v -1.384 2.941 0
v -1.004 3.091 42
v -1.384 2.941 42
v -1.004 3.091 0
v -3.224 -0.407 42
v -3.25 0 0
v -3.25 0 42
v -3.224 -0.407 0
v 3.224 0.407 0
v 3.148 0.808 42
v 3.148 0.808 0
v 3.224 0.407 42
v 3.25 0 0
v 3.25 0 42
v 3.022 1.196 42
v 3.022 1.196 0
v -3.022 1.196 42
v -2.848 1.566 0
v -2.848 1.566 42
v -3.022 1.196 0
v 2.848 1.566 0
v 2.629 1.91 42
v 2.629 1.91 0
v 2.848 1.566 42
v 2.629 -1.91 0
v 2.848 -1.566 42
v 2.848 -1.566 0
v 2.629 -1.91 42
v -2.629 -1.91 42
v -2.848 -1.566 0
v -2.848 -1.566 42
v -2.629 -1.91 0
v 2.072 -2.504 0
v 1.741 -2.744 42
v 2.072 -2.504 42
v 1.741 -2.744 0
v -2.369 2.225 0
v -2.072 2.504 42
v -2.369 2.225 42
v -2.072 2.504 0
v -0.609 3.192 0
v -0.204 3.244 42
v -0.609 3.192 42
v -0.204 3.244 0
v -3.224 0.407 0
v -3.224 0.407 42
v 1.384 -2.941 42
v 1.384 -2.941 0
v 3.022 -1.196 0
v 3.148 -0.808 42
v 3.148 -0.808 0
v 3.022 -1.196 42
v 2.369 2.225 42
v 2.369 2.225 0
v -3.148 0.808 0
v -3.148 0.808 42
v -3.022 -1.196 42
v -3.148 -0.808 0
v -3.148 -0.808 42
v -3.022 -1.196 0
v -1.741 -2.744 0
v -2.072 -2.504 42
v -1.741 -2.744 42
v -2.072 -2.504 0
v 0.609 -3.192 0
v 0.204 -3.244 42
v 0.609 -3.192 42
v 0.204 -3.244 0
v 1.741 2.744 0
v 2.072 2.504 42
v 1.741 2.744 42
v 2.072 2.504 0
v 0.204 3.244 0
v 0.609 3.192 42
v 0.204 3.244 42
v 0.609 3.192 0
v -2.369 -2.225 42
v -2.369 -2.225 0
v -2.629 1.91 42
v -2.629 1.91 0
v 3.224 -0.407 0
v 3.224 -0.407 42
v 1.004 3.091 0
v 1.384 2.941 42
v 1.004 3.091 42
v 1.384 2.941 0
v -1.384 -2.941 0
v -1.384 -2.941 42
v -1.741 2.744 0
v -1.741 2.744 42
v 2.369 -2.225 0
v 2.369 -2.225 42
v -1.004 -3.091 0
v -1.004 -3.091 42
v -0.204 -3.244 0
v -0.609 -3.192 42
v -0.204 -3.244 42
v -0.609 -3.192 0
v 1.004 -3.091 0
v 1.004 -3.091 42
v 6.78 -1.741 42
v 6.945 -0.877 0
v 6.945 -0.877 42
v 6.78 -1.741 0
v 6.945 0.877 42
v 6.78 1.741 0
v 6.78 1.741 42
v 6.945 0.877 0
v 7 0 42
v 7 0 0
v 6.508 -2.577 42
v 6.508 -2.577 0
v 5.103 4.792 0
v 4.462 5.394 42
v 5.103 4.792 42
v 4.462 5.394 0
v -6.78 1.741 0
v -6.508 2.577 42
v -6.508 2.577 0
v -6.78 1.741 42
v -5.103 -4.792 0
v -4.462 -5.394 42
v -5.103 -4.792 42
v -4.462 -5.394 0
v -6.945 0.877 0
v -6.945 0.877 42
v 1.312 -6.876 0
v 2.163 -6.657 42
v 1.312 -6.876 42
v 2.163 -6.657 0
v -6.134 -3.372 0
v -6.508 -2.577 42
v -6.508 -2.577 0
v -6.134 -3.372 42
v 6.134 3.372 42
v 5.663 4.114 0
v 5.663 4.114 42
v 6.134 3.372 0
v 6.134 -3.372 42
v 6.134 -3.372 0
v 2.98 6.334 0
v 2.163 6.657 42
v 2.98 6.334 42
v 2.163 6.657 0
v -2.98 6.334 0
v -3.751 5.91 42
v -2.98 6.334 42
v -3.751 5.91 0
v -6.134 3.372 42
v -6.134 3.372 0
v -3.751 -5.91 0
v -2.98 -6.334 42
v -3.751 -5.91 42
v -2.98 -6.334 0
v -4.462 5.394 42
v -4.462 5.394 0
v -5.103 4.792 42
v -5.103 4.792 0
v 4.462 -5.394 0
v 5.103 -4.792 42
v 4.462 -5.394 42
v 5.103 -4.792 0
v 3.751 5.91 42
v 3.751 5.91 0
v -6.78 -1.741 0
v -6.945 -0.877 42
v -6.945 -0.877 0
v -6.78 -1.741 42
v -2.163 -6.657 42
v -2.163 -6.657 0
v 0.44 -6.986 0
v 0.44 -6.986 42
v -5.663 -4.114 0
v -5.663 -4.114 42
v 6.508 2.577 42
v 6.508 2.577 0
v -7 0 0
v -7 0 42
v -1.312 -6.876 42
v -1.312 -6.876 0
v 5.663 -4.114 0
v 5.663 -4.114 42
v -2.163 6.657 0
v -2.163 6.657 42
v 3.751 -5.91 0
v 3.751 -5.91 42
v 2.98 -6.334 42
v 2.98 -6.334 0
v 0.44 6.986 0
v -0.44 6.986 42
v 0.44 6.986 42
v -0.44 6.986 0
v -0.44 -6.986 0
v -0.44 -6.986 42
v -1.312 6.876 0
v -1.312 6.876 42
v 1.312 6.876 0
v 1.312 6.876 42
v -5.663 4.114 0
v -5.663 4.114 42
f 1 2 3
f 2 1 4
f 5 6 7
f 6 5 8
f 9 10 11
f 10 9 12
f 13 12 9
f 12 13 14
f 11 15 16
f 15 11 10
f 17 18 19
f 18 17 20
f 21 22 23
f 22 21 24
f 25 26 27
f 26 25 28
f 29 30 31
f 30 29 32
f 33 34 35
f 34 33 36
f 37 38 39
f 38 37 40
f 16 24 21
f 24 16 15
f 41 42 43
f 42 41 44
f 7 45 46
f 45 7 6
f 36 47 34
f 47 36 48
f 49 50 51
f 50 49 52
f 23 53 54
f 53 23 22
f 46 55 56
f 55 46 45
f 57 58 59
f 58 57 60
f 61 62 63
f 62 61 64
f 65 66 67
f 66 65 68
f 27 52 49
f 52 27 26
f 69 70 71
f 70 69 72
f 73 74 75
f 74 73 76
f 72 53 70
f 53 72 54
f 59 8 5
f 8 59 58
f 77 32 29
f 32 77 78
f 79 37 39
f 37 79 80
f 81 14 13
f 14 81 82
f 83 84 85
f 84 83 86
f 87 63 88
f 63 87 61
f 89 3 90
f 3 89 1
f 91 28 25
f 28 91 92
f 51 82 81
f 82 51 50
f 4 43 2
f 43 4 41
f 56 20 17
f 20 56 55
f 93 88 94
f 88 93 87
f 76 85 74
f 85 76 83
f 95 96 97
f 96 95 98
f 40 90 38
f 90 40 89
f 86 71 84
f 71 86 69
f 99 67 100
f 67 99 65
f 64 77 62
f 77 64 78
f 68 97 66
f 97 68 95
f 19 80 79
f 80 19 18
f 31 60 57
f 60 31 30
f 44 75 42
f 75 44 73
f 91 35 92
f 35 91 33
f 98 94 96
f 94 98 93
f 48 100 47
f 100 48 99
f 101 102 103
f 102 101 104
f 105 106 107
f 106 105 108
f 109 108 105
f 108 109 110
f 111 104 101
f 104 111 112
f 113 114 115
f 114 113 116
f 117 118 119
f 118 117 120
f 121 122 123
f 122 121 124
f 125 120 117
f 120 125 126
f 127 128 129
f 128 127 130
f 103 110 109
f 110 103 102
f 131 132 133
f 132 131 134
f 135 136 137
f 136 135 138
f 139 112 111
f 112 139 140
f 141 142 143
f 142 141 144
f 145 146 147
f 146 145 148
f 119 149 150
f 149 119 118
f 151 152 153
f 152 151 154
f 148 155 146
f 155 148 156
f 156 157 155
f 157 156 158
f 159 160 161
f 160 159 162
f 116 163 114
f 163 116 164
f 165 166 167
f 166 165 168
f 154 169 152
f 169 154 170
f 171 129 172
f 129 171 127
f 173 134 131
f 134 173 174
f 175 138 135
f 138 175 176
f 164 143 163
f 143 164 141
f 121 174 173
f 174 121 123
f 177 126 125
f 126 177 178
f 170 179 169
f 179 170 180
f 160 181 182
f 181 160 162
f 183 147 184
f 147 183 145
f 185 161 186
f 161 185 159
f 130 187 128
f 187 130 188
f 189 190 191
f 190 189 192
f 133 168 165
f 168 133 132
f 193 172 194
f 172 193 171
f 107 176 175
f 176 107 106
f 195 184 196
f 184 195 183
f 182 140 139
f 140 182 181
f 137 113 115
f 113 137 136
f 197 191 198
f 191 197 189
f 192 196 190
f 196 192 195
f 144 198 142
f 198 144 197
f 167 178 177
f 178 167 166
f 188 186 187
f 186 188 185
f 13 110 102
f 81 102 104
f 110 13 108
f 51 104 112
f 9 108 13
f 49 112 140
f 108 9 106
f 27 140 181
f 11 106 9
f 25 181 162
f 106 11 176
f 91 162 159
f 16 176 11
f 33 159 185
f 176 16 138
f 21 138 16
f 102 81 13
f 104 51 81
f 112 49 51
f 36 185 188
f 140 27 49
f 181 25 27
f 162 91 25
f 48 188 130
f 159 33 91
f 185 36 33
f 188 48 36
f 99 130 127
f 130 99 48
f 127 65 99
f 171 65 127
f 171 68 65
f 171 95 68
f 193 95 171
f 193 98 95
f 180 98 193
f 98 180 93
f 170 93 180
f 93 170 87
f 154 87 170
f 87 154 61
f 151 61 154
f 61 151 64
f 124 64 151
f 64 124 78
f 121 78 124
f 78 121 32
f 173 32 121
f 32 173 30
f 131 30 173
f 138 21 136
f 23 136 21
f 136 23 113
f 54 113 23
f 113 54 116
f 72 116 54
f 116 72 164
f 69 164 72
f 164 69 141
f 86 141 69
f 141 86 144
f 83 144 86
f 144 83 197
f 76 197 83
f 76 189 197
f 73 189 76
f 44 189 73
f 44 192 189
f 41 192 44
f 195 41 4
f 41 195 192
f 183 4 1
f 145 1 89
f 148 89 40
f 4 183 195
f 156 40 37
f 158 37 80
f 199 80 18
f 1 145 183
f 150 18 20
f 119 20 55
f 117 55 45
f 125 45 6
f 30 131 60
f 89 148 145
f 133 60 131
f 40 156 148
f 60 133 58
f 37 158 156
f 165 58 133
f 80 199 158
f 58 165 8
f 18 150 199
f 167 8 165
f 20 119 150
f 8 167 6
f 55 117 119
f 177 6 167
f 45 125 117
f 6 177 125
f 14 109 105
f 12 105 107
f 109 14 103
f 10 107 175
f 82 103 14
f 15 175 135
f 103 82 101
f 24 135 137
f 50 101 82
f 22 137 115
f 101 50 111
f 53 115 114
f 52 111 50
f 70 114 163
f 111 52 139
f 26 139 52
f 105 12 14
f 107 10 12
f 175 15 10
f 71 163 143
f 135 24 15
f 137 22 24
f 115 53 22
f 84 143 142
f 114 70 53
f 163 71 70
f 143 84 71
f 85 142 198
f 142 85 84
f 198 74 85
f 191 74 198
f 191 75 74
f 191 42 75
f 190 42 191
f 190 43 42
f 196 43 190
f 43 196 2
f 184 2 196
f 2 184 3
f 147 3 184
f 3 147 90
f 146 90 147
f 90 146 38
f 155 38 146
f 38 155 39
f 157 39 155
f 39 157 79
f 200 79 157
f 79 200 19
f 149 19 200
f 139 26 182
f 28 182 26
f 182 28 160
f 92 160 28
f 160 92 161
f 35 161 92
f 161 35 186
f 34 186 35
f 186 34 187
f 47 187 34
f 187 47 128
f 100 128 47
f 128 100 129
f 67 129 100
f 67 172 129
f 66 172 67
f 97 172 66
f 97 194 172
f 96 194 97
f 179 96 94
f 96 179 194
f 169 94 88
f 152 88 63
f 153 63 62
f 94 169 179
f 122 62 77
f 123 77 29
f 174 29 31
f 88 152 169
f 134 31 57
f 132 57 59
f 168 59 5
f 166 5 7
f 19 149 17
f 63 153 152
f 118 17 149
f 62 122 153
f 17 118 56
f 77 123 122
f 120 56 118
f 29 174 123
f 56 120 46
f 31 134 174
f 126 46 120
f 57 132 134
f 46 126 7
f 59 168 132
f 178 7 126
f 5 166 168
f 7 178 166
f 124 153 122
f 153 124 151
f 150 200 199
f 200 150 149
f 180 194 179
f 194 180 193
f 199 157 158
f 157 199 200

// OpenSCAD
$fn = 50;


difference() {
	union() {
		cylinder(h = 42, r = 7.0000000000);
	}
	union() {
		translate(v = [0, 0, -100]) {
			cylinder(h = 200, r = 3.2500000000);
		}
		translate(v = [0, 0, -100]) {
			cylinder(h = 200, r = 1.8000000000);
		}
	}
}
